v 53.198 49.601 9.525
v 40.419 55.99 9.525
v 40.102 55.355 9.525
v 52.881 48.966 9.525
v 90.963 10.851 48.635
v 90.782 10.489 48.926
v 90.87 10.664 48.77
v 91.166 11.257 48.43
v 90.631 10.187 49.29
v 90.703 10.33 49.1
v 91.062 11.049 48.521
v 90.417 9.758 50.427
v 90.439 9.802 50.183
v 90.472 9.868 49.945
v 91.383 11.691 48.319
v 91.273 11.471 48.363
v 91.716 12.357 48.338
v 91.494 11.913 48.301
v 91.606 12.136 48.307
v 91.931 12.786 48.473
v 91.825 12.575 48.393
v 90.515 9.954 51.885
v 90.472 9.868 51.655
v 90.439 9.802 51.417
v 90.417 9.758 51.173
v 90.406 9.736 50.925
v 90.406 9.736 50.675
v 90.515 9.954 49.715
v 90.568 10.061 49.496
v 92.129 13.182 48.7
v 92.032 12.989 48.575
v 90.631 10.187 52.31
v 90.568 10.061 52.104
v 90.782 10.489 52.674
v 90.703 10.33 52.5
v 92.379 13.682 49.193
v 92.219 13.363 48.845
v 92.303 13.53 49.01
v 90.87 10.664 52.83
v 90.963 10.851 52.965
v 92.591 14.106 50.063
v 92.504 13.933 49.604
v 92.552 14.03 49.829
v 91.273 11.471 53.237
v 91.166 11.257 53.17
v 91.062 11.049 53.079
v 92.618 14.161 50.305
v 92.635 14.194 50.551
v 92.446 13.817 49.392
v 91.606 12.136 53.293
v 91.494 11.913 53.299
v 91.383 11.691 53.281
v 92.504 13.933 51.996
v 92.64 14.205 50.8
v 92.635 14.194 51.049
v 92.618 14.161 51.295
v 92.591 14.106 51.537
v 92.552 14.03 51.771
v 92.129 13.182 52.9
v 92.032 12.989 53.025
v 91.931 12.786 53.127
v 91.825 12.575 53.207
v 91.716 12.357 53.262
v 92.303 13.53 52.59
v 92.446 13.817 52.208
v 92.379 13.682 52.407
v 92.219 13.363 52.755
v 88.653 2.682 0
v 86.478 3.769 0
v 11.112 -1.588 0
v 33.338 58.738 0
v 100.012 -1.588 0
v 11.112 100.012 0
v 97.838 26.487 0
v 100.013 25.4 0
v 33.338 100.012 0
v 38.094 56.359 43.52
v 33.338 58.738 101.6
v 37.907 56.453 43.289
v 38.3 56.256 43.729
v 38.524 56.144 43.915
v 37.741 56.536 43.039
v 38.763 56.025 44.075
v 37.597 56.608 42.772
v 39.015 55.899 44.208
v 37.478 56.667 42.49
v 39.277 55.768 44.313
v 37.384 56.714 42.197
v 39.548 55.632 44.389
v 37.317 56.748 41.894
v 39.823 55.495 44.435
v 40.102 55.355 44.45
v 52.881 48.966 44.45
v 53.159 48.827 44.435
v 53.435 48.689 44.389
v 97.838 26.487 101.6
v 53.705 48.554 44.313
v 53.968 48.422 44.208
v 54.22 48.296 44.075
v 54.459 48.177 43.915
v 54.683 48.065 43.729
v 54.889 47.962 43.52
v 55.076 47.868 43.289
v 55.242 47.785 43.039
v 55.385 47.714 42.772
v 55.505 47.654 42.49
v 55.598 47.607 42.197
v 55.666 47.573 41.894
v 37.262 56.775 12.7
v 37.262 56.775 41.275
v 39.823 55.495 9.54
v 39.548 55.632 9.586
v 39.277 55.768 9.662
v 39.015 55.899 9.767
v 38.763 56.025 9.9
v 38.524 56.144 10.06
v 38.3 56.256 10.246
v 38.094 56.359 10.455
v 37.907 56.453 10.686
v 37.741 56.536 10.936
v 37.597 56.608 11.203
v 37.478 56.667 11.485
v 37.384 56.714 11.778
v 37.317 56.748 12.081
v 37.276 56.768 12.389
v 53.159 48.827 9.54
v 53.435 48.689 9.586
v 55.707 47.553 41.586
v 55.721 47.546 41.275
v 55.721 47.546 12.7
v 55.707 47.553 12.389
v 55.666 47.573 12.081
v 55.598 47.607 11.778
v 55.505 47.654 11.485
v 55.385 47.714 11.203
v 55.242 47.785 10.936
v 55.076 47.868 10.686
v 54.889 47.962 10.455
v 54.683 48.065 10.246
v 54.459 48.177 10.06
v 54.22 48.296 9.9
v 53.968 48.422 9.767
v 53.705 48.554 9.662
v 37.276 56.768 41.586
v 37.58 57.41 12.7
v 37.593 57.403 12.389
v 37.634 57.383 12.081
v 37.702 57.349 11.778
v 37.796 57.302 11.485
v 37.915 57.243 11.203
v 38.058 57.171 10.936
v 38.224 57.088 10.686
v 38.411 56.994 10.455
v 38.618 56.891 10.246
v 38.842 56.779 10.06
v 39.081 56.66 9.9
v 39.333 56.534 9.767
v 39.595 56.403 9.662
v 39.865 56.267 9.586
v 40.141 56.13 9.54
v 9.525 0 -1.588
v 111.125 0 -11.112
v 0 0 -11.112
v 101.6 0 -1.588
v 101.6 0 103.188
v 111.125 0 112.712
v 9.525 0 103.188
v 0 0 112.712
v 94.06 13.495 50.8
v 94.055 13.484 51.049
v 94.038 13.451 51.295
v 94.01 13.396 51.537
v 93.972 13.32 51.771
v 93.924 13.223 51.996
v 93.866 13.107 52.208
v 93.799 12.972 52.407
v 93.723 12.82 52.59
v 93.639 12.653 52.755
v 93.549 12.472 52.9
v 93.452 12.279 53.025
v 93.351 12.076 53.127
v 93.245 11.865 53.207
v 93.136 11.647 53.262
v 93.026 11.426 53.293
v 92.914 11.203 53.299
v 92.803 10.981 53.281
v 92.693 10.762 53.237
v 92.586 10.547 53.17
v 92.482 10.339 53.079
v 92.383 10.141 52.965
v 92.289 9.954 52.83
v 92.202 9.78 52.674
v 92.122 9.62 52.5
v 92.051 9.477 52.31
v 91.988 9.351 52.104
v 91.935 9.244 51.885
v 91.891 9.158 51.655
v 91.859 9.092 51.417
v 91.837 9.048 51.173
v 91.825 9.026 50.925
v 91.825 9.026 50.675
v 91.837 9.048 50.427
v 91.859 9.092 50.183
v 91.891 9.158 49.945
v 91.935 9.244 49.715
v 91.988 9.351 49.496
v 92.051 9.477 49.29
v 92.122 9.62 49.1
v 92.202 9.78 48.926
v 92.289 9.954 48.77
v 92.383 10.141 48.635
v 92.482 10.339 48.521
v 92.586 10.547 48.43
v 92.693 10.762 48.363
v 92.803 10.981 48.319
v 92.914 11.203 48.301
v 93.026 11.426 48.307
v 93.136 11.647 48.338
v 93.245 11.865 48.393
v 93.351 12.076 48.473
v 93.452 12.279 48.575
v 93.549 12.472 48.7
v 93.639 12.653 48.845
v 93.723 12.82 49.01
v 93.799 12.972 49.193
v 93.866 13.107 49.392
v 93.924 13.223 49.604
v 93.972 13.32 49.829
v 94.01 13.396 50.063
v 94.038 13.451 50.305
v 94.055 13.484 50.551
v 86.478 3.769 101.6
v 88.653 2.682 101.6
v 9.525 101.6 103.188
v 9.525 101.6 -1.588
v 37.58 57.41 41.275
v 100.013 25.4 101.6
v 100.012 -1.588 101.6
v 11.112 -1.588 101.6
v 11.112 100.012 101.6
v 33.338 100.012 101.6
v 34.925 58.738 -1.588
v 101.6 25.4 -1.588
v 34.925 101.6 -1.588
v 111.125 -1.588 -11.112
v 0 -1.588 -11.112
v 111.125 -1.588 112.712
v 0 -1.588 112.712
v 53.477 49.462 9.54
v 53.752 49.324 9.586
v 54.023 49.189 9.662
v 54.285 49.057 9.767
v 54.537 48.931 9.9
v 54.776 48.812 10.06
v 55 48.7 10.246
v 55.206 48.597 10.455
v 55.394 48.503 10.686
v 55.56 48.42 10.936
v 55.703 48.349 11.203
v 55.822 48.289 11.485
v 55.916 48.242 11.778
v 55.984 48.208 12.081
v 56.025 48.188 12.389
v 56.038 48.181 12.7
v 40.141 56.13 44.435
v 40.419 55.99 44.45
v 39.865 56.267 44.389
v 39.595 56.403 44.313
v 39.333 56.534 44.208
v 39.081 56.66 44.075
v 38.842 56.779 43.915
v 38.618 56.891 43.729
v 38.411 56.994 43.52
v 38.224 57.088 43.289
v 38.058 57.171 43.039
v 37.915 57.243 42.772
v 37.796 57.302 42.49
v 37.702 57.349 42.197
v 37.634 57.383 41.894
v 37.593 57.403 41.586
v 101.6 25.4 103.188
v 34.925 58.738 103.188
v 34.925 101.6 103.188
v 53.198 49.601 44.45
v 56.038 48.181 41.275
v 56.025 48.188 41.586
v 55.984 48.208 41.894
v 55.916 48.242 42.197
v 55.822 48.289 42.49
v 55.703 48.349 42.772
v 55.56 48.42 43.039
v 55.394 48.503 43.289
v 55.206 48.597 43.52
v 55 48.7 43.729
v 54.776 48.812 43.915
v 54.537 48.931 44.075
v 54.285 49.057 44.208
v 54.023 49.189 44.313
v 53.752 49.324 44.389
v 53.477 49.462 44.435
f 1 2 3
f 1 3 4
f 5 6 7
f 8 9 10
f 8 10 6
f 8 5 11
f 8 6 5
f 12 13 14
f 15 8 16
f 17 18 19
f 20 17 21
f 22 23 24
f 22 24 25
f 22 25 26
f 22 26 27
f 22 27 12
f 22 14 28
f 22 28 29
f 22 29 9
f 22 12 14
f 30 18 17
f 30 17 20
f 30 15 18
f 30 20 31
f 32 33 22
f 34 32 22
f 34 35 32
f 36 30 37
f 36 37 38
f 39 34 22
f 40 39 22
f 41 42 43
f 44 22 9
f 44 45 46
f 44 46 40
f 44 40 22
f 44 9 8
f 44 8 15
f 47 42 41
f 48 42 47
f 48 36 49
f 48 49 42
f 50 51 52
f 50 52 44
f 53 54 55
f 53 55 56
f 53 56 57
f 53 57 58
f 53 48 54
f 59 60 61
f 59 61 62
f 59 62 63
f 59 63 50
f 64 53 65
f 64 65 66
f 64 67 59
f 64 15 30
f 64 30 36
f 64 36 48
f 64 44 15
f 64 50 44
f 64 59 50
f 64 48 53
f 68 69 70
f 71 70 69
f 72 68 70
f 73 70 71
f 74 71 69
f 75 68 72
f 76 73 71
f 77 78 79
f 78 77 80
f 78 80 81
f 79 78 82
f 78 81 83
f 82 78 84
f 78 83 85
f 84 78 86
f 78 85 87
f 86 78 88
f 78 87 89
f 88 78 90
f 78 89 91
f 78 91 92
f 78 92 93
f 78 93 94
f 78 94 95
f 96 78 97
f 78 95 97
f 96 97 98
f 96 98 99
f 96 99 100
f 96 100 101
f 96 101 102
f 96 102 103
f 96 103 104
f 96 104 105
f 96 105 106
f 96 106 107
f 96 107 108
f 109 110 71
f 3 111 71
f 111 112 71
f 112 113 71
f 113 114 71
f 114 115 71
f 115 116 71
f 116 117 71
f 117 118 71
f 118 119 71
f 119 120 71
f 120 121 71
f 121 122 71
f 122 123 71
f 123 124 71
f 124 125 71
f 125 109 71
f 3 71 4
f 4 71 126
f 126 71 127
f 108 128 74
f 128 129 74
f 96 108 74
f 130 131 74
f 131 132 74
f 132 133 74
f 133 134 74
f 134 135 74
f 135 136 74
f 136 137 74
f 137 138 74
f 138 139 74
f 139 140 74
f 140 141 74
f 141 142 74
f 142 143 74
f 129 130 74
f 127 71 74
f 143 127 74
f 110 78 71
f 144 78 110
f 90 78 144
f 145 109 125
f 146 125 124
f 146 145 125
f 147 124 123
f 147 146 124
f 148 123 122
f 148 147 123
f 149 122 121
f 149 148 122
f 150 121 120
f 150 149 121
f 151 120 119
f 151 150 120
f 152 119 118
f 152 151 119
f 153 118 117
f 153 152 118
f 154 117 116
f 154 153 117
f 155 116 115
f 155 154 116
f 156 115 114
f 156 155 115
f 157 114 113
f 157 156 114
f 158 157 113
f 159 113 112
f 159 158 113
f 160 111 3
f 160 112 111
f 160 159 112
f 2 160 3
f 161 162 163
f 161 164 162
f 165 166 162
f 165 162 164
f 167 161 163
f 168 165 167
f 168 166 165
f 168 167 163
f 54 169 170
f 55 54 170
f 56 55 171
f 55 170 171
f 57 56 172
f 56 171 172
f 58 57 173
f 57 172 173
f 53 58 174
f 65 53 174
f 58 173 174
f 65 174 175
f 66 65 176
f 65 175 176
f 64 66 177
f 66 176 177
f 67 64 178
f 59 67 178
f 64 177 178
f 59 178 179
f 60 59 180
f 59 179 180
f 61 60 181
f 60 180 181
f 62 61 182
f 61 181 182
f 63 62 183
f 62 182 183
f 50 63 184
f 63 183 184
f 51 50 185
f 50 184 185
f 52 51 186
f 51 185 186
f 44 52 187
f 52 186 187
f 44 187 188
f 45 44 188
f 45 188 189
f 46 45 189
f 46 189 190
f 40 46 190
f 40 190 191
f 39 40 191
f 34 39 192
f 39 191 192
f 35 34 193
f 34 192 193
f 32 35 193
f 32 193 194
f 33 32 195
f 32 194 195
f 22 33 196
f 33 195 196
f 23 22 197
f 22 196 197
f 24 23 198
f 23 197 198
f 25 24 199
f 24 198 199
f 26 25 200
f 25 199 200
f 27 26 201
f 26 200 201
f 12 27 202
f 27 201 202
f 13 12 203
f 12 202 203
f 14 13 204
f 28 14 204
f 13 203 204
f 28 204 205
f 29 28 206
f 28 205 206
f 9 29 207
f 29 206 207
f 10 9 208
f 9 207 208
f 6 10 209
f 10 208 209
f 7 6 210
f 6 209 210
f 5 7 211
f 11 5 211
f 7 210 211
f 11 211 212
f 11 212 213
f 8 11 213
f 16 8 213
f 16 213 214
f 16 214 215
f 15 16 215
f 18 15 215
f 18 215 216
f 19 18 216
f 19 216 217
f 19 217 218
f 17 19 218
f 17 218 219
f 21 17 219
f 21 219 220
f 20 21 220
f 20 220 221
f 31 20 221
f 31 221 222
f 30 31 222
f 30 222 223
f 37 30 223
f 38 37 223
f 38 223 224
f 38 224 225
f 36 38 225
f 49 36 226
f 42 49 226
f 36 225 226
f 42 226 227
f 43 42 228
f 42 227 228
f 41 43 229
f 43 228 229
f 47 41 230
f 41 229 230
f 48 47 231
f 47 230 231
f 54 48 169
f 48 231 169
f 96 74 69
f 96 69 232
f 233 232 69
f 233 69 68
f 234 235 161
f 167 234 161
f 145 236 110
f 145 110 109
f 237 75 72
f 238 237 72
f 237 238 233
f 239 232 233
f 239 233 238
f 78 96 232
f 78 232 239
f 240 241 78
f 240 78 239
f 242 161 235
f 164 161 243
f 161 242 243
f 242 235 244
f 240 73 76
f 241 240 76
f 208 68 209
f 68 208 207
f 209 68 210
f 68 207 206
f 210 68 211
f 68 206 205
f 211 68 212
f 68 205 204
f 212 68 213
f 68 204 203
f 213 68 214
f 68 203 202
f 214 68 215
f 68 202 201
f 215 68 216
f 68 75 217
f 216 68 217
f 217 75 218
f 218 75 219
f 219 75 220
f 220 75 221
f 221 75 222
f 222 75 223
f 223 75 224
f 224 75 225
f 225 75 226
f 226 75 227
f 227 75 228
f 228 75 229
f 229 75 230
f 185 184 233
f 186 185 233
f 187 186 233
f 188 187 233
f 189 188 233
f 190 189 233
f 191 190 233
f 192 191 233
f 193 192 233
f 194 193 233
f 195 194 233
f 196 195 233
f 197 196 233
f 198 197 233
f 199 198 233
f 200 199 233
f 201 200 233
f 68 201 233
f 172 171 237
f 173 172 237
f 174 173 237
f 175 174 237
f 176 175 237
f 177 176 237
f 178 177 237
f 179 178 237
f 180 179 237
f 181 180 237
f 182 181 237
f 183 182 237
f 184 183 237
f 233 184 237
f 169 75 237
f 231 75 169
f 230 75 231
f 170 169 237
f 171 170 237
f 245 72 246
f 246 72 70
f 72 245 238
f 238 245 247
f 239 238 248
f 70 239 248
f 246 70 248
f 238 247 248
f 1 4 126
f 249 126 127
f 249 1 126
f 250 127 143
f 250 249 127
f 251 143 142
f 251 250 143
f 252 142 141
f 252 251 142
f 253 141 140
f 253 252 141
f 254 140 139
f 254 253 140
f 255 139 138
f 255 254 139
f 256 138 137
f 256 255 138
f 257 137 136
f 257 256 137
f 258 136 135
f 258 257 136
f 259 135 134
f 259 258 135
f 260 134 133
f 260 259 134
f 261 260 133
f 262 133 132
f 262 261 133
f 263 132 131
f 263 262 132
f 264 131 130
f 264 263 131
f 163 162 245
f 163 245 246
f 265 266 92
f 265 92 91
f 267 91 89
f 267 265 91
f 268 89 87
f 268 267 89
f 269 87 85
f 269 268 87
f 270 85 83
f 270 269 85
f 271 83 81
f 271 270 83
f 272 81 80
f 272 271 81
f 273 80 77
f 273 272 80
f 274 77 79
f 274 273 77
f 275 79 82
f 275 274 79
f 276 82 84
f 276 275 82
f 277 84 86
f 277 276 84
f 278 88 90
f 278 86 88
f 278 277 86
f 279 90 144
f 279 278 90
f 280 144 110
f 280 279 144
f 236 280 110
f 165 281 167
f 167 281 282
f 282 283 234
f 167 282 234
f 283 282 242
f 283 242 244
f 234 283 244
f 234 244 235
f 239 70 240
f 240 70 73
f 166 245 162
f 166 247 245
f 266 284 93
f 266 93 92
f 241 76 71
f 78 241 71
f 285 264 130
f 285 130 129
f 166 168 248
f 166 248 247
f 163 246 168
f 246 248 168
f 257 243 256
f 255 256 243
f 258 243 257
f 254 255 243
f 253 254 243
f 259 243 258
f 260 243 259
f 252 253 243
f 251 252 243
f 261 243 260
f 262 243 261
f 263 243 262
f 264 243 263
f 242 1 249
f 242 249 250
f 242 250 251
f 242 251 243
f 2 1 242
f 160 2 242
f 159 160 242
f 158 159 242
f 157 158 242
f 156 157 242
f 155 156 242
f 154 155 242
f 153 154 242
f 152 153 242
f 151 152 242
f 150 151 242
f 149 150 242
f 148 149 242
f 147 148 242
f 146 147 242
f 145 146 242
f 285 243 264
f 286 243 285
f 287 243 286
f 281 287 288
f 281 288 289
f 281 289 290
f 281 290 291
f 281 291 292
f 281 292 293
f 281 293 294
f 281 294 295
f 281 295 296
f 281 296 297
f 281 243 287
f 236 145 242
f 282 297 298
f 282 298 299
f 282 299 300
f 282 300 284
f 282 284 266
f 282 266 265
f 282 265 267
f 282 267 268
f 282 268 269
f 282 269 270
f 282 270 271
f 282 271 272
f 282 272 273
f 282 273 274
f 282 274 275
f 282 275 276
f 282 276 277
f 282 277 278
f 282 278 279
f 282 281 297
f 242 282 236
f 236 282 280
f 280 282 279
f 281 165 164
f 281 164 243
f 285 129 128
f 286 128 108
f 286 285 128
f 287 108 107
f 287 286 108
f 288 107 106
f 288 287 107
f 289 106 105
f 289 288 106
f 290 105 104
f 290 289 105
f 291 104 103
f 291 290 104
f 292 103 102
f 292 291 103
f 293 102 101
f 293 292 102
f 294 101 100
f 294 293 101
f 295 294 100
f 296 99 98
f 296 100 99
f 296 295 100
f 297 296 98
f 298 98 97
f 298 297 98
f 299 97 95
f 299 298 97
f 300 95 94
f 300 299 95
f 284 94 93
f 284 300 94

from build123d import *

# Parameters (mm, degrees)
EXTRUDE1_DEPTH     = 101.6
EXTRUDE2_DEPTH     = 1.5875
EXTRUDE3_DEPTH     = 1.5875
SKETCH4_W          = 111.125
SKETCH4_H          = 1.5875
EXTRUDE4_DEPTH     = 9.525
SKETCH5_W          = 111.125
SKETCH5_H          = 1.5875
EXTRUDE5_DEPTH     = 9.525
SKETCH6_W          = 2.431707811
SKETCH6_H          = 101.6
EXTRUDE6_DEPTH     = 25.4
SKETCH8_R          = 2.5
CUT_EXTRUDE1_DEPTH = 1.5875
CUT_EXTRUDE2_DEPTH = 3


with BuildPart() as part:
    # Sketch1 → Extrude1 (new body)
    with BuildSketch(Plane.XY):
        Polygon((101.6, 0), (101.6, 25.4), (34.925, 58.7375), (34.925, 101.6), (9.525, 101.6), (9.525, 0), (0, 0), (0, -1.5875), (11.1125, -1.5875), (11.1125, 100.0125), (33.3375, 100.0125), (33.3375, 58.7375), (100.0125, 25.4), (100.0125, -1.5875), (111.125, -1.5875), (111.125, 0), align=None)
    extrude(amount=EXTRUDE1_DEPTH)

    # Sketch2 → Extrude2 (add)
    with BuildSketch(Plane.XY.offset(101.6)):
        Polygon((0, 0), (9.525, 0), (9.525, 101.6), (34.925, 101.6), (34.925, 58.7375), (101.6, 25.4), (101.6, 0), (111.125, 0), (111.125, -1.5875), (0, -1.5875), align=None)
    extrude(amount=EXTRUDE2_DEPTH)

    # Sketch3 → Extrude3 (add)
    with BuildSketch(Plane(origin=(0, 0, 0), x_dir=(-1, 0, 0), z_dir=(0, 0, -1))):
        Polygon((-111.125, -1.5875), (-111.125, 0), (-101.6, 0), (-101.6, 25.4), (-34.925, 58.7375), (-34.925, 101.6), (-9.525, 101.6), (-9.525, 0), (0, 0), (0, -1.5875), align=None)
    extrude(amount=EXTRUDE3_DEPTH)

    # Sketch4 → Extrude4 (add)
    with BuildSketch(Plane.XY.offset(103.1875)):
        with Locations((55.5625, -0.79375)):
            Rectangle(SKETCH4_W, SKETCH4_H)
    extrude(amount=EXTRUDE4_DEPTH)

    # Sketch5 → Extrude5 (add)
    with BuildSketch(Plane(origin=(0, 0, -1.5875), x_dir=(-1, 0, 0), z_dir=(0, 0, -1))):
        with Locations((-55.5625, -0.79375)):
            Rectangle(SKETCH5_W, SKETCH5_H)
    extrude(amount=EXTRUDE5_DEPTH)

    # Sketch6 → Extrude6 (add)
    with BuildSketch(Plane(origin=(30.1625, 60.325, 0), x_dir=(0.8944271909999159, -0.44721359549995804, 0), z_dir=(-0.44721359549995804, -0.8944271909999159, 0))):
        with Locations((76.878820209, 50.8)):
            Rectangle(SKETCH6_W, SKETCH6_H)
    extrude(amount=EXTRUDE6_DEPTH)

    # Sketch8 → Cut-Extrude1 (cut)
    with BuildSketch(Plane(origin=(69.85, -34.925, 0), x_dir=(0, 0, -1), z_dir=(0.8944271909999159, -0.447213595499958, 0))):
        with Locations(Location((-50.8, 51.635400371, 0), (0, 0, 90))):
            Circle(SKETCH8_R)
    extrude(amount=-CUT_EXTRUDE1_DEPTH, mode=Mode.SUBTRACT)

    # Sketch9 → Cut-Extrude2 (cut)
    with BuildSketch(Plane(origin=(30.48, 60.96, 0), x_dir=(-0.8944271909999159, 0.44721359549995804, 0), z_dir=(0.44721359549995804, 0.8944271909999159, 0))):
        with BuildLine():
            Line((-25.4, 44.45), (-11.1125, 44.45))
            ThreePointArc((-11.1125, 44.45), (-8.86743597, 43.52006403), (-7.9375, 41.275))
            Line((-7.9375, 41.275), (-7.9375, 12.7))
            ThreePointArc((-7.9375, 12.7), (-8.86743597, 10.45493597), (-11.1125, 9.525))
            Line((-11.1125, 9.525), (-25.4, 9.525))
            ThreePointArc((-25.4, 9.525), (-27.64506403, 10.45493597), (-28.575, 12.7))
            Line((-28.575, 12.7), (-28.575, 41.275))
            ThreePointArc((-28.575, 41.275), (-27.64506403, 43.52006403), (-25.4, 44.45))
        make_face()
    extrude(amount=-CUT_EXTRUDE2_DEPTH, mode=Mode.SUBTRACT)


solid = part.part
